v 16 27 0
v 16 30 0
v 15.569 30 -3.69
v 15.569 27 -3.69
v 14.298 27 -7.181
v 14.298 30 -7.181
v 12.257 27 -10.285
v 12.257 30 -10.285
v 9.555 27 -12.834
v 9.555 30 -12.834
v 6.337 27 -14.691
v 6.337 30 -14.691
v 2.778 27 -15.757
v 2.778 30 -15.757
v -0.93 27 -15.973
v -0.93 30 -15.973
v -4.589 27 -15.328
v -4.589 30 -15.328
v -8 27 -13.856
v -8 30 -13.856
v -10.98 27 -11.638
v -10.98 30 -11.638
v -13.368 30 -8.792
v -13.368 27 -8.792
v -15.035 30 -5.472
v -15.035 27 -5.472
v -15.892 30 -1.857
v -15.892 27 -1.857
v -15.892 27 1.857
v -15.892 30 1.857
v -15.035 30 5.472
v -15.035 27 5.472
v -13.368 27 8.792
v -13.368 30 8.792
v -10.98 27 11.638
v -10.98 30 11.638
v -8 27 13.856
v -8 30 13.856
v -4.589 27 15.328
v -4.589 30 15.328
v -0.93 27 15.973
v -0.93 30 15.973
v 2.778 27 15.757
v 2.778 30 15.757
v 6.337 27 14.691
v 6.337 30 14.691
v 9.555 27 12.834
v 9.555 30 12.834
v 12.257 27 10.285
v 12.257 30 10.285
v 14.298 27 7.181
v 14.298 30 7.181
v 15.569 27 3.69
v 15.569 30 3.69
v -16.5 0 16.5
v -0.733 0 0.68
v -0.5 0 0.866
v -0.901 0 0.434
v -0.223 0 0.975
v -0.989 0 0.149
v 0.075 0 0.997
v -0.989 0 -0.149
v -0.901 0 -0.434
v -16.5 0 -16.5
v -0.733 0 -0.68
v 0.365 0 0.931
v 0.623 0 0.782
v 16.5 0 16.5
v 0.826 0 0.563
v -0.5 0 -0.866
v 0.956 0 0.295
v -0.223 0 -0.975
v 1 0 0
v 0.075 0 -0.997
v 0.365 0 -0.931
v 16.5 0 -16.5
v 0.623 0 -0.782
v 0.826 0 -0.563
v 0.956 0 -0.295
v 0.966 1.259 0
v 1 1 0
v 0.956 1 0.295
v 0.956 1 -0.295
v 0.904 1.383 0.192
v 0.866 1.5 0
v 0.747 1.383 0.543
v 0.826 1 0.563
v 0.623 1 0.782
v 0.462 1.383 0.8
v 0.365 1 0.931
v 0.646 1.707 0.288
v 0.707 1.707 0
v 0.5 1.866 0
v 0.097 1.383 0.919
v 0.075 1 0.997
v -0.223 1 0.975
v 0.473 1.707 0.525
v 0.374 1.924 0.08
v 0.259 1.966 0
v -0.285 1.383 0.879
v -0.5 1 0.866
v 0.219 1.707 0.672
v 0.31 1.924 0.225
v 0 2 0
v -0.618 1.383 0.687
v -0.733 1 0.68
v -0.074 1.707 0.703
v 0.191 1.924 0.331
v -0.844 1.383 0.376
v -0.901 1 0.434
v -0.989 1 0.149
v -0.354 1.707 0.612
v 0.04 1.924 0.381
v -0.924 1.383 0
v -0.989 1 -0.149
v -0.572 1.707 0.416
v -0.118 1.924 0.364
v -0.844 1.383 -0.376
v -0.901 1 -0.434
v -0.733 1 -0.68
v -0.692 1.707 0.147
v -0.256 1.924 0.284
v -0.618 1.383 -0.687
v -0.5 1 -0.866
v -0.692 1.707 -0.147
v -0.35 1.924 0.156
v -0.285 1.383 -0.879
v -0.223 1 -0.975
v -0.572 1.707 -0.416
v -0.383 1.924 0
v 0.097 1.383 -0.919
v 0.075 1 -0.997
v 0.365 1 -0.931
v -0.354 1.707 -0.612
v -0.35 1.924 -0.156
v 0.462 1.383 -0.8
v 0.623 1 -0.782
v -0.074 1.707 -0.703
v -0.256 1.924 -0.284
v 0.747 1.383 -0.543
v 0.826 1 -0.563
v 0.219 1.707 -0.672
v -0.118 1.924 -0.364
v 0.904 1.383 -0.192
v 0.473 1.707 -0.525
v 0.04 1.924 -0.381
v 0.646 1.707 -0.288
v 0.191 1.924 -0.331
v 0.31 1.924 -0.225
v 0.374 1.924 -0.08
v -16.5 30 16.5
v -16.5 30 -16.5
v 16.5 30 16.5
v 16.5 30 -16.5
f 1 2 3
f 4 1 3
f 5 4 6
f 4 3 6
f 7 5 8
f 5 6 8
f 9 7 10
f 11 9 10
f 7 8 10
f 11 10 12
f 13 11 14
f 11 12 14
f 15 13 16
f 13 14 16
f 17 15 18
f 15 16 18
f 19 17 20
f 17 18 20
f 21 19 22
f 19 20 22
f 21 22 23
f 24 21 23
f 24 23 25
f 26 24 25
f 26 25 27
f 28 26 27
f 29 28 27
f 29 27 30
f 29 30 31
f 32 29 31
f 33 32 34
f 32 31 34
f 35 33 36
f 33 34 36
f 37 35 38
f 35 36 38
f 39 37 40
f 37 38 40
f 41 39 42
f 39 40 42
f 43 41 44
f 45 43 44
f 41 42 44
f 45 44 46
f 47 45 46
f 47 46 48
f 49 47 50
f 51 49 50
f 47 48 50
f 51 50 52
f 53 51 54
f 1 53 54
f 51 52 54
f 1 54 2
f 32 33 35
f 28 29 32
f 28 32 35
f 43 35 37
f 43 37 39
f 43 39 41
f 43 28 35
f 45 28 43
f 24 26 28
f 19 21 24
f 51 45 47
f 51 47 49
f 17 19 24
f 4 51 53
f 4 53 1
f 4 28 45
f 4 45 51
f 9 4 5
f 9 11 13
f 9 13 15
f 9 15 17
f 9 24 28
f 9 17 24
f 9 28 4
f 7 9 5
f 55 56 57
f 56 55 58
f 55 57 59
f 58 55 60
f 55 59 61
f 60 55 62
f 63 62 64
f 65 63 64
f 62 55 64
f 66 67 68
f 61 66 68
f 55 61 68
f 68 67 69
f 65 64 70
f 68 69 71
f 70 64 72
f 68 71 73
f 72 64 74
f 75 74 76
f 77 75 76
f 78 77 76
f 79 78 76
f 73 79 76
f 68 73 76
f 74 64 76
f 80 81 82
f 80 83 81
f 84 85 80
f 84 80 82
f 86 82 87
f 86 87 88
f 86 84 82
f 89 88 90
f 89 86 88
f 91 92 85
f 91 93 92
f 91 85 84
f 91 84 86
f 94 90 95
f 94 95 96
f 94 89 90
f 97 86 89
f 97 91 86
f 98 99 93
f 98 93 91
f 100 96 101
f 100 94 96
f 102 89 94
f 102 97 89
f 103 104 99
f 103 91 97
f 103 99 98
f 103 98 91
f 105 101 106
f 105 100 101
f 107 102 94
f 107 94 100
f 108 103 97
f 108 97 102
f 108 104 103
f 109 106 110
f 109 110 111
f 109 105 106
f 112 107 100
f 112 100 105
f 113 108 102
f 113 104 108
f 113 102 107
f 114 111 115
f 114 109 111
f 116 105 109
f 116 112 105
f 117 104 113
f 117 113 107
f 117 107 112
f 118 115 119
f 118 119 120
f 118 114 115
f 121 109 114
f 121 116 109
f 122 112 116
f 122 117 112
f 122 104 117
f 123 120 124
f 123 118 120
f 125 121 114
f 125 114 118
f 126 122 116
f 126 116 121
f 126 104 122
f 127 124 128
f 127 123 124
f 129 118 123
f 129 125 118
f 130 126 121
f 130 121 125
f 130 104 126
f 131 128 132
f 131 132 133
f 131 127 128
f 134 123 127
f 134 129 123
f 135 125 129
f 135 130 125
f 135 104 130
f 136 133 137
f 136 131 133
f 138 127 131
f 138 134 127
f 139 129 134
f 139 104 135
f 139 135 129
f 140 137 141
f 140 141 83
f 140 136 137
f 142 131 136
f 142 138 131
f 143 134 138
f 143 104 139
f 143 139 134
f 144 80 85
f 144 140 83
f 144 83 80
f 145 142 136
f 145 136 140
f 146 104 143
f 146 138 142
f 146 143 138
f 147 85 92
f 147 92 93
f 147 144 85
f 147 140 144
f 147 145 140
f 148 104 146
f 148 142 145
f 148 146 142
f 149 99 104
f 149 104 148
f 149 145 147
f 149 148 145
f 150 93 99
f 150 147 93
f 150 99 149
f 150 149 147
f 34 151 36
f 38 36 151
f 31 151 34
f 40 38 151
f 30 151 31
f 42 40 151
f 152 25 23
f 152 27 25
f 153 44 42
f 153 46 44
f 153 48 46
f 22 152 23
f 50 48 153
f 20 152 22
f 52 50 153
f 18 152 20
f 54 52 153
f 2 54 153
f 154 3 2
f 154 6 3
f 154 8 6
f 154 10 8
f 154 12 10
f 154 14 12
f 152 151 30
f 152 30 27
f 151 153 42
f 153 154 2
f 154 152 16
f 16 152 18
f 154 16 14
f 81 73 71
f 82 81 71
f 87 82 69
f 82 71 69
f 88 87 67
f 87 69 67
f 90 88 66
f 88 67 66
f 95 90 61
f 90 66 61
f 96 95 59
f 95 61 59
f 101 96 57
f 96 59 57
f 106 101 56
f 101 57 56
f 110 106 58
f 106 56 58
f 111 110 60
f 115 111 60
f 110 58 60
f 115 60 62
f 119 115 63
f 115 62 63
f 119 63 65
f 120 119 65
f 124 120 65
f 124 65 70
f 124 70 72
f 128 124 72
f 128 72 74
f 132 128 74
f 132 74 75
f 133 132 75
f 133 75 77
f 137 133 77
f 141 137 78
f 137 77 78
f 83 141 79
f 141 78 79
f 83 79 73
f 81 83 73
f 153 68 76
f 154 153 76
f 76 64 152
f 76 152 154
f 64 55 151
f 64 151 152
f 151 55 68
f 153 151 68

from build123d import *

# Parameters (mm, degrees)
SKETCH1_W           = 33
SKETCH1_H           = 33
BOSS_EXTRUDE1_DEPTH = 30
SKETCH2_R           = 16
CUT_EXTRUDE1_DEPTH  = 3
SKETCH3_R           = 1
CUT_EXTRUDE2_DEPTH  = 2
FILLET1_R           = 1


with BuildPart() as part:
    # Sketch1 → Boss-Extrude1 (new body)
    with BuildSketch(Plane(origin=(0, 0, 0), x_dir=(1, 0, 0), z_dir=(0, 1, 0))):
        Rectangle(SKETCH1_W, SKETCH1_H)
    extrude(amount=BOSS_EXTRUDE1_DEPTH)

    # Sketch2 → Cut-Extrude1 (cut)
    with BuildSketch(Plane(origin=(0, 30, 0), x_dir=(1, 0, 0), z_dir=(0, 1, 0))):
        Circle(SKETCH2_R)
    extrude(amount=-CUT_EXTRUDE1_DEPTH, mode=Mode.SUBTRACT)

    # Sketch3 → Cut-Extrude2 (cut)
    with BuildSketch(Plane.XZ):
        Circle(SKETCH3_R)
    extrude(amount=-CUT_EXTRUDE2_DEPTH, mode=Mode.SUBTRACT)

    # Fillet1
    fillet1_edges = [part.edges().sort_by_distance(p)[0] for p in [
        (-1, 2, 0),
    ]]
    fillet(fillet1_edges, radius=FILLET1_R)


solid = part.part
